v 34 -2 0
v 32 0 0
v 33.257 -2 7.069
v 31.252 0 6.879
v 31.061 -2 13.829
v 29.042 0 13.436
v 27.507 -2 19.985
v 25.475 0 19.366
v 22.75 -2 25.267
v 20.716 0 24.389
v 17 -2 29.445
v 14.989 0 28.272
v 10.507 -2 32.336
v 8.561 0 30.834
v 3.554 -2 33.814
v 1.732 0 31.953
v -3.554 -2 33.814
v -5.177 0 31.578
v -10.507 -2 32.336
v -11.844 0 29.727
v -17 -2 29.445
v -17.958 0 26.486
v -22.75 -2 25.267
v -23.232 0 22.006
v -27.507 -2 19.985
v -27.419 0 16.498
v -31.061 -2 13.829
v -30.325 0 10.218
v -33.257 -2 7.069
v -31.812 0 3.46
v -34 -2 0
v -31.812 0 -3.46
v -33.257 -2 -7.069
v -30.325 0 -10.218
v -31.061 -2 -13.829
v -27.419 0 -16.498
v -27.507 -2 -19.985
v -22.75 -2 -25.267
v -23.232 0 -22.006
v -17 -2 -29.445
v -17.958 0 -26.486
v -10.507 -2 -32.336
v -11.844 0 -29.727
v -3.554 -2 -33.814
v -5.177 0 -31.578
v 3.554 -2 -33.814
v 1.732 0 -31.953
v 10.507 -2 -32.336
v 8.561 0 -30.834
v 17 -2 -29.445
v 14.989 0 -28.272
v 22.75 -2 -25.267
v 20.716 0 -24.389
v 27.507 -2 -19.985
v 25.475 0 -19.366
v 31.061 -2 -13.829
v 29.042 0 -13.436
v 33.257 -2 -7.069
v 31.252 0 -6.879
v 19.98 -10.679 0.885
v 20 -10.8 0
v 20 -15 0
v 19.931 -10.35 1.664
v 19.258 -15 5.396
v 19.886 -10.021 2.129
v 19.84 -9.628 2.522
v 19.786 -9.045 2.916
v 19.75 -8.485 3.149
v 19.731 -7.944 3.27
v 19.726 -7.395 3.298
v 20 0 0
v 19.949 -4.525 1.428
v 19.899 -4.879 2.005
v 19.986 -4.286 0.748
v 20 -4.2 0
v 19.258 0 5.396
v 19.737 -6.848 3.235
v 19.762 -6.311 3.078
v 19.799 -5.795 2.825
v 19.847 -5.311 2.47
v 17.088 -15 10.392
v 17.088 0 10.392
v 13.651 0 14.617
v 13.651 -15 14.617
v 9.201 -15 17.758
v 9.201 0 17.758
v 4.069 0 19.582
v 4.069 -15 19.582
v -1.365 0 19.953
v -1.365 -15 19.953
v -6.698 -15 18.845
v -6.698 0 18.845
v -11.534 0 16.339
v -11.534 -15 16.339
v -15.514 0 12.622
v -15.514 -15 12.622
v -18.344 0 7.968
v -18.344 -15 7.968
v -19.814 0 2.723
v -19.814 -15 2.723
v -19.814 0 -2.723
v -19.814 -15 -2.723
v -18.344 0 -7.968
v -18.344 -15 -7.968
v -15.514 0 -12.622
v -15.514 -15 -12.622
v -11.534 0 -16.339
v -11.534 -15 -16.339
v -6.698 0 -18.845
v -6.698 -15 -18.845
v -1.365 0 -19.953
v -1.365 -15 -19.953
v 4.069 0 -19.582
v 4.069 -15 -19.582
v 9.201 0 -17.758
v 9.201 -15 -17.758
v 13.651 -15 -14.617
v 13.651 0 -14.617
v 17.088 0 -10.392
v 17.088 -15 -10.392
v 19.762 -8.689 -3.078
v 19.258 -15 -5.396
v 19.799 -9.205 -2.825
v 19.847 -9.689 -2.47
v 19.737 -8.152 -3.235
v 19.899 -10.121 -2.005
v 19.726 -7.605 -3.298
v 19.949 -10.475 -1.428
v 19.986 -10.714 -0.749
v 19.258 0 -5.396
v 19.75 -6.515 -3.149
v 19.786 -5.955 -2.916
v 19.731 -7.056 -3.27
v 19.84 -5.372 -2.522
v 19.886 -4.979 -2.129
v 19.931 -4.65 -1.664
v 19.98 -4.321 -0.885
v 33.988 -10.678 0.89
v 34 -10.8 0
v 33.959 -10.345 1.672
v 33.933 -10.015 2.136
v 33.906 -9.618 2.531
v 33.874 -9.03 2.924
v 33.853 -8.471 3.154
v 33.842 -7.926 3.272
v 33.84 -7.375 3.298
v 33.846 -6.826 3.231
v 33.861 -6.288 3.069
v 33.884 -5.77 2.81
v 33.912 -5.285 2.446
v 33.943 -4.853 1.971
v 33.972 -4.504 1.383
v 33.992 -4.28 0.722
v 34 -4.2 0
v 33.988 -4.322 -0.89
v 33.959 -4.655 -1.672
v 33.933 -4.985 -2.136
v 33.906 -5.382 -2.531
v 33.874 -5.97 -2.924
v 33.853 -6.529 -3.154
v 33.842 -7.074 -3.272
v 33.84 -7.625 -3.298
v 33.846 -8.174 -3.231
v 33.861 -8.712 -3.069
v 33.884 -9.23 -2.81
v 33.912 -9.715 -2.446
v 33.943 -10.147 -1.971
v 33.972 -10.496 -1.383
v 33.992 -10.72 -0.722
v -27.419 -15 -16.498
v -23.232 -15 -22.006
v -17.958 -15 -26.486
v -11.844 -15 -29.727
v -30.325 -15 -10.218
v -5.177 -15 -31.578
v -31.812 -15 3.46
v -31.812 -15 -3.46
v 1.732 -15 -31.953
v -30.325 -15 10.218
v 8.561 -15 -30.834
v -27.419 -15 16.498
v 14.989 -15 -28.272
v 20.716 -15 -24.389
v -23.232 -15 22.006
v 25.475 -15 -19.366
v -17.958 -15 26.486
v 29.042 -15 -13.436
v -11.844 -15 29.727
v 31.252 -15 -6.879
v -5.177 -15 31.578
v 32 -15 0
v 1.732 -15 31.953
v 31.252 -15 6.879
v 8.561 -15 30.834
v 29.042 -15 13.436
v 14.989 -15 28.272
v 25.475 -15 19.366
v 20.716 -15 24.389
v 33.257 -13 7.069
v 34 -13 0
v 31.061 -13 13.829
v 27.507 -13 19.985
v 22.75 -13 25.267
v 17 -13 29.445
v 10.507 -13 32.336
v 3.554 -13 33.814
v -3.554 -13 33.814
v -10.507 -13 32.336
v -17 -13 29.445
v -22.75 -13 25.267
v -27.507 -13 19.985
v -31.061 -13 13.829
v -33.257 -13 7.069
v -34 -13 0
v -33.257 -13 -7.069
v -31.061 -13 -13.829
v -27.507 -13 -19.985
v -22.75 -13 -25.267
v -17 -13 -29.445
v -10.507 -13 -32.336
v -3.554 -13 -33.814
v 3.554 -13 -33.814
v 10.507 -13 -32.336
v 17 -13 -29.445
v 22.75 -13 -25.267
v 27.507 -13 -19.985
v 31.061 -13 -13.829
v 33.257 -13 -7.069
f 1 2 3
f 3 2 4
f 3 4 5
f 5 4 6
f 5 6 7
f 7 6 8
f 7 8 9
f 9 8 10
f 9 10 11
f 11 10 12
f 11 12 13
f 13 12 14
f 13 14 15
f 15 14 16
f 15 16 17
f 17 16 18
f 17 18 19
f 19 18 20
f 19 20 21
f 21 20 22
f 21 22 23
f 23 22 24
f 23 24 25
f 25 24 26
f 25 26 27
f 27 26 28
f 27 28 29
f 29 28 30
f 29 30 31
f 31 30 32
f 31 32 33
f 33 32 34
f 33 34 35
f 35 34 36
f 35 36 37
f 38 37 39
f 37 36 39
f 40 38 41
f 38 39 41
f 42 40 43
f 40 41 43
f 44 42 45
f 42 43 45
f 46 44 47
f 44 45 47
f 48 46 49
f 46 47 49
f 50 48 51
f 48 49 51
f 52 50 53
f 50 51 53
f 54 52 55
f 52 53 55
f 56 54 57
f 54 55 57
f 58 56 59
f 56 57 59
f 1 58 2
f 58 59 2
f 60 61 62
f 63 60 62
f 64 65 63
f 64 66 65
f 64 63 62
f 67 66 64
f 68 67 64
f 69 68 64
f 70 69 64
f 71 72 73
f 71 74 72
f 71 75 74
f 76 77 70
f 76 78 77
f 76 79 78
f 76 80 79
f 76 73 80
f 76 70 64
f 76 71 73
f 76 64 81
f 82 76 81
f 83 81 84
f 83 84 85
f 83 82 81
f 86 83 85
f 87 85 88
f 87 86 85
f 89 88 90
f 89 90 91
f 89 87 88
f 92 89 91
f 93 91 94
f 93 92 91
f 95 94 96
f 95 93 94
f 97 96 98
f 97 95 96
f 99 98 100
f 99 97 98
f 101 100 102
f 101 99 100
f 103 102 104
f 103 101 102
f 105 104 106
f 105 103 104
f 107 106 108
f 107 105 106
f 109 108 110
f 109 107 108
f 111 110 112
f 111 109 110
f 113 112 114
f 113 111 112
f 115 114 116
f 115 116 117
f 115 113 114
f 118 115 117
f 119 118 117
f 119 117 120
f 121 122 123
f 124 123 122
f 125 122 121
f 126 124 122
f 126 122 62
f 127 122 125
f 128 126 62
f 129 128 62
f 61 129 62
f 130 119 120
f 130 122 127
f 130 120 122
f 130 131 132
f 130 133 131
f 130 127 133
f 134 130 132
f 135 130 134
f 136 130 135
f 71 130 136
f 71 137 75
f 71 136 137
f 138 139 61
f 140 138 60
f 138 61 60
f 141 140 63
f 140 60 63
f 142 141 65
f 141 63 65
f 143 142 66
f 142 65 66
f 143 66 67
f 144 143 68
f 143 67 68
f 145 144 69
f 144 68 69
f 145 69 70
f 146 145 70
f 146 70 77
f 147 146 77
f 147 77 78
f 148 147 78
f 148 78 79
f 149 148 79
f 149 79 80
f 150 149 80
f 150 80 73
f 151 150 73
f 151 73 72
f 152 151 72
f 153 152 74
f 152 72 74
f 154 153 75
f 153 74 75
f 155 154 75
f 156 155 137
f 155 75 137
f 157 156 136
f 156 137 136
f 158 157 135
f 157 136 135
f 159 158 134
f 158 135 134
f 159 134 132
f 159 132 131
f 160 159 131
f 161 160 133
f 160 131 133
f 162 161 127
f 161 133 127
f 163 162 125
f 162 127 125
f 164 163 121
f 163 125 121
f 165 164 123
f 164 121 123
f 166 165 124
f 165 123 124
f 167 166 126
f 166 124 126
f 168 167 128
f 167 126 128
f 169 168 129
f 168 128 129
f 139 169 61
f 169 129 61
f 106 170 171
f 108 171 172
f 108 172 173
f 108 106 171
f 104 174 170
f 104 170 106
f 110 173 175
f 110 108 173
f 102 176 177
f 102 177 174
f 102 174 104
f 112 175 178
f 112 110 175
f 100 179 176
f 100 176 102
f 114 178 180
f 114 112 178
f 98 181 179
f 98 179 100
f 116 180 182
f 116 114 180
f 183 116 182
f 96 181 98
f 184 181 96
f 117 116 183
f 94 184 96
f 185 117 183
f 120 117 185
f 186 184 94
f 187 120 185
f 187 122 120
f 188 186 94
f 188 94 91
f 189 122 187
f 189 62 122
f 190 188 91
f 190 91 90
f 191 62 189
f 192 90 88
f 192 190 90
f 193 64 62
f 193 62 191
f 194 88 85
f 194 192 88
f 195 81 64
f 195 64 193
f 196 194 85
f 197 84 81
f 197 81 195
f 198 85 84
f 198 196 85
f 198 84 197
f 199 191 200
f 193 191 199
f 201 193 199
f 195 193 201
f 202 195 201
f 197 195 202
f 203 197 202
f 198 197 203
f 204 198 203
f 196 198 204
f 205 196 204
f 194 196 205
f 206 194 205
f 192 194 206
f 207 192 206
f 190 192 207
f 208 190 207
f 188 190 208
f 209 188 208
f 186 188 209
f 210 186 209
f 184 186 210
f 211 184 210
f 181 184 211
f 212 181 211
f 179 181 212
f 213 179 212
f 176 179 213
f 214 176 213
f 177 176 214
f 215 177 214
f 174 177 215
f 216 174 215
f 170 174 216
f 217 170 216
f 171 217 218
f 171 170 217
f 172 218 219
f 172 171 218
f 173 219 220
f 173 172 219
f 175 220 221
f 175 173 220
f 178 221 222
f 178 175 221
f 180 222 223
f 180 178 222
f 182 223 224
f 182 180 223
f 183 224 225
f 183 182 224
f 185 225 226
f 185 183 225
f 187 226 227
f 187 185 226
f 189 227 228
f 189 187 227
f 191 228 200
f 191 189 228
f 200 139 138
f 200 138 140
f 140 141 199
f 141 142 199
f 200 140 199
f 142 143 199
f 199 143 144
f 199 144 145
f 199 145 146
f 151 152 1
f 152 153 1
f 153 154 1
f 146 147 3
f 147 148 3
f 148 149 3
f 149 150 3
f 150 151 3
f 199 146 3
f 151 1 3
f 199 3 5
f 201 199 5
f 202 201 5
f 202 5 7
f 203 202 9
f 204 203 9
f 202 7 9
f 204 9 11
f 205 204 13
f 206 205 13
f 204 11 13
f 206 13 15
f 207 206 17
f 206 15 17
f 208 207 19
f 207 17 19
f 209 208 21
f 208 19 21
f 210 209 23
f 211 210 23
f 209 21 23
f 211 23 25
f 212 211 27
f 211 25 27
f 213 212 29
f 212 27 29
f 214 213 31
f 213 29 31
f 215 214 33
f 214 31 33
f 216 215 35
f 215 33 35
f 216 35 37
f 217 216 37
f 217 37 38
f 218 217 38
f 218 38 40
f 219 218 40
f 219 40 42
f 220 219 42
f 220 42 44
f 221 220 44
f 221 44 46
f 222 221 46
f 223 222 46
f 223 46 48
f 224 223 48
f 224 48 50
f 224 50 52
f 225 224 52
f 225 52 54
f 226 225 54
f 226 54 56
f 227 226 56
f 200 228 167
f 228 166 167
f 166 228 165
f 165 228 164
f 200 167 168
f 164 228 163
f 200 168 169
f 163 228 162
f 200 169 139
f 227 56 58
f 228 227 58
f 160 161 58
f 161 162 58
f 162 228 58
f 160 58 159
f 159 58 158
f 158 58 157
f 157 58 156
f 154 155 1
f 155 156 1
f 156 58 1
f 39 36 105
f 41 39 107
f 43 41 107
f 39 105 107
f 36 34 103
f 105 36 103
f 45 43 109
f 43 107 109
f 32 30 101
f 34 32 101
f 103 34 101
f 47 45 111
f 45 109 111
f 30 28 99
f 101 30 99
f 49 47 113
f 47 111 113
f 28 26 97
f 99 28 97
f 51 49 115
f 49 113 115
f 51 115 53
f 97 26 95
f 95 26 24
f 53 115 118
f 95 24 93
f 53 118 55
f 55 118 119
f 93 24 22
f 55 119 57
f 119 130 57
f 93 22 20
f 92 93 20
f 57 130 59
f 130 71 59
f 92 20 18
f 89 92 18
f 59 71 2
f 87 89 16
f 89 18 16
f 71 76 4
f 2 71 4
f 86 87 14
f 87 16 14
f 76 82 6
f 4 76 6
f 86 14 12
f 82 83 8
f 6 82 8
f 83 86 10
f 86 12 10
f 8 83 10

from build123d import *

# Parameters (mm, degrees)
F0_R     = 34
F0_R_2   = 20
F1_DEPTH = 15
F2_SIZE  = 2
F5_D     = 6.6
F5_DEPTH = 15
F5_START = 0.1605261
F5_TIP   = 1.9828400428


with BuildPart() as f1:
    # F0 (on Front) → F1 (new body)
    with BuildSketch(Plane.XZ):
        Circle(F0_R)
        Circle(F0_R_2, mode=Mode.SUBTRACT)
    extrude(amount=F1_DEPTH)

    # F2
    f2_edges = [f1.edges().sort_by_distance(p)[0] for p in [
        (-34, 0, 0),
        (-34, -15, 0),
    ]]
    chamfer(f2_edges, length=F2_SIZE)

    # F5
    # its depths count from where the whole tool has entered the part; down to there all is cleared
    with Locations(Plane.YZ.offset(34).offset(-F5_START)):
        with Locations((-7.5, 0)):
            Hole(F5_D / 2, depth=F5_DEPTH)
            with Locations((0, 0, -(F5_DEPTH + F5_TIP / 2))):  # 118° drill point
                Cone(0, F5_D / 2, F5_TIP, mode=Mode.SUBTRACT)


solid = f1.part
